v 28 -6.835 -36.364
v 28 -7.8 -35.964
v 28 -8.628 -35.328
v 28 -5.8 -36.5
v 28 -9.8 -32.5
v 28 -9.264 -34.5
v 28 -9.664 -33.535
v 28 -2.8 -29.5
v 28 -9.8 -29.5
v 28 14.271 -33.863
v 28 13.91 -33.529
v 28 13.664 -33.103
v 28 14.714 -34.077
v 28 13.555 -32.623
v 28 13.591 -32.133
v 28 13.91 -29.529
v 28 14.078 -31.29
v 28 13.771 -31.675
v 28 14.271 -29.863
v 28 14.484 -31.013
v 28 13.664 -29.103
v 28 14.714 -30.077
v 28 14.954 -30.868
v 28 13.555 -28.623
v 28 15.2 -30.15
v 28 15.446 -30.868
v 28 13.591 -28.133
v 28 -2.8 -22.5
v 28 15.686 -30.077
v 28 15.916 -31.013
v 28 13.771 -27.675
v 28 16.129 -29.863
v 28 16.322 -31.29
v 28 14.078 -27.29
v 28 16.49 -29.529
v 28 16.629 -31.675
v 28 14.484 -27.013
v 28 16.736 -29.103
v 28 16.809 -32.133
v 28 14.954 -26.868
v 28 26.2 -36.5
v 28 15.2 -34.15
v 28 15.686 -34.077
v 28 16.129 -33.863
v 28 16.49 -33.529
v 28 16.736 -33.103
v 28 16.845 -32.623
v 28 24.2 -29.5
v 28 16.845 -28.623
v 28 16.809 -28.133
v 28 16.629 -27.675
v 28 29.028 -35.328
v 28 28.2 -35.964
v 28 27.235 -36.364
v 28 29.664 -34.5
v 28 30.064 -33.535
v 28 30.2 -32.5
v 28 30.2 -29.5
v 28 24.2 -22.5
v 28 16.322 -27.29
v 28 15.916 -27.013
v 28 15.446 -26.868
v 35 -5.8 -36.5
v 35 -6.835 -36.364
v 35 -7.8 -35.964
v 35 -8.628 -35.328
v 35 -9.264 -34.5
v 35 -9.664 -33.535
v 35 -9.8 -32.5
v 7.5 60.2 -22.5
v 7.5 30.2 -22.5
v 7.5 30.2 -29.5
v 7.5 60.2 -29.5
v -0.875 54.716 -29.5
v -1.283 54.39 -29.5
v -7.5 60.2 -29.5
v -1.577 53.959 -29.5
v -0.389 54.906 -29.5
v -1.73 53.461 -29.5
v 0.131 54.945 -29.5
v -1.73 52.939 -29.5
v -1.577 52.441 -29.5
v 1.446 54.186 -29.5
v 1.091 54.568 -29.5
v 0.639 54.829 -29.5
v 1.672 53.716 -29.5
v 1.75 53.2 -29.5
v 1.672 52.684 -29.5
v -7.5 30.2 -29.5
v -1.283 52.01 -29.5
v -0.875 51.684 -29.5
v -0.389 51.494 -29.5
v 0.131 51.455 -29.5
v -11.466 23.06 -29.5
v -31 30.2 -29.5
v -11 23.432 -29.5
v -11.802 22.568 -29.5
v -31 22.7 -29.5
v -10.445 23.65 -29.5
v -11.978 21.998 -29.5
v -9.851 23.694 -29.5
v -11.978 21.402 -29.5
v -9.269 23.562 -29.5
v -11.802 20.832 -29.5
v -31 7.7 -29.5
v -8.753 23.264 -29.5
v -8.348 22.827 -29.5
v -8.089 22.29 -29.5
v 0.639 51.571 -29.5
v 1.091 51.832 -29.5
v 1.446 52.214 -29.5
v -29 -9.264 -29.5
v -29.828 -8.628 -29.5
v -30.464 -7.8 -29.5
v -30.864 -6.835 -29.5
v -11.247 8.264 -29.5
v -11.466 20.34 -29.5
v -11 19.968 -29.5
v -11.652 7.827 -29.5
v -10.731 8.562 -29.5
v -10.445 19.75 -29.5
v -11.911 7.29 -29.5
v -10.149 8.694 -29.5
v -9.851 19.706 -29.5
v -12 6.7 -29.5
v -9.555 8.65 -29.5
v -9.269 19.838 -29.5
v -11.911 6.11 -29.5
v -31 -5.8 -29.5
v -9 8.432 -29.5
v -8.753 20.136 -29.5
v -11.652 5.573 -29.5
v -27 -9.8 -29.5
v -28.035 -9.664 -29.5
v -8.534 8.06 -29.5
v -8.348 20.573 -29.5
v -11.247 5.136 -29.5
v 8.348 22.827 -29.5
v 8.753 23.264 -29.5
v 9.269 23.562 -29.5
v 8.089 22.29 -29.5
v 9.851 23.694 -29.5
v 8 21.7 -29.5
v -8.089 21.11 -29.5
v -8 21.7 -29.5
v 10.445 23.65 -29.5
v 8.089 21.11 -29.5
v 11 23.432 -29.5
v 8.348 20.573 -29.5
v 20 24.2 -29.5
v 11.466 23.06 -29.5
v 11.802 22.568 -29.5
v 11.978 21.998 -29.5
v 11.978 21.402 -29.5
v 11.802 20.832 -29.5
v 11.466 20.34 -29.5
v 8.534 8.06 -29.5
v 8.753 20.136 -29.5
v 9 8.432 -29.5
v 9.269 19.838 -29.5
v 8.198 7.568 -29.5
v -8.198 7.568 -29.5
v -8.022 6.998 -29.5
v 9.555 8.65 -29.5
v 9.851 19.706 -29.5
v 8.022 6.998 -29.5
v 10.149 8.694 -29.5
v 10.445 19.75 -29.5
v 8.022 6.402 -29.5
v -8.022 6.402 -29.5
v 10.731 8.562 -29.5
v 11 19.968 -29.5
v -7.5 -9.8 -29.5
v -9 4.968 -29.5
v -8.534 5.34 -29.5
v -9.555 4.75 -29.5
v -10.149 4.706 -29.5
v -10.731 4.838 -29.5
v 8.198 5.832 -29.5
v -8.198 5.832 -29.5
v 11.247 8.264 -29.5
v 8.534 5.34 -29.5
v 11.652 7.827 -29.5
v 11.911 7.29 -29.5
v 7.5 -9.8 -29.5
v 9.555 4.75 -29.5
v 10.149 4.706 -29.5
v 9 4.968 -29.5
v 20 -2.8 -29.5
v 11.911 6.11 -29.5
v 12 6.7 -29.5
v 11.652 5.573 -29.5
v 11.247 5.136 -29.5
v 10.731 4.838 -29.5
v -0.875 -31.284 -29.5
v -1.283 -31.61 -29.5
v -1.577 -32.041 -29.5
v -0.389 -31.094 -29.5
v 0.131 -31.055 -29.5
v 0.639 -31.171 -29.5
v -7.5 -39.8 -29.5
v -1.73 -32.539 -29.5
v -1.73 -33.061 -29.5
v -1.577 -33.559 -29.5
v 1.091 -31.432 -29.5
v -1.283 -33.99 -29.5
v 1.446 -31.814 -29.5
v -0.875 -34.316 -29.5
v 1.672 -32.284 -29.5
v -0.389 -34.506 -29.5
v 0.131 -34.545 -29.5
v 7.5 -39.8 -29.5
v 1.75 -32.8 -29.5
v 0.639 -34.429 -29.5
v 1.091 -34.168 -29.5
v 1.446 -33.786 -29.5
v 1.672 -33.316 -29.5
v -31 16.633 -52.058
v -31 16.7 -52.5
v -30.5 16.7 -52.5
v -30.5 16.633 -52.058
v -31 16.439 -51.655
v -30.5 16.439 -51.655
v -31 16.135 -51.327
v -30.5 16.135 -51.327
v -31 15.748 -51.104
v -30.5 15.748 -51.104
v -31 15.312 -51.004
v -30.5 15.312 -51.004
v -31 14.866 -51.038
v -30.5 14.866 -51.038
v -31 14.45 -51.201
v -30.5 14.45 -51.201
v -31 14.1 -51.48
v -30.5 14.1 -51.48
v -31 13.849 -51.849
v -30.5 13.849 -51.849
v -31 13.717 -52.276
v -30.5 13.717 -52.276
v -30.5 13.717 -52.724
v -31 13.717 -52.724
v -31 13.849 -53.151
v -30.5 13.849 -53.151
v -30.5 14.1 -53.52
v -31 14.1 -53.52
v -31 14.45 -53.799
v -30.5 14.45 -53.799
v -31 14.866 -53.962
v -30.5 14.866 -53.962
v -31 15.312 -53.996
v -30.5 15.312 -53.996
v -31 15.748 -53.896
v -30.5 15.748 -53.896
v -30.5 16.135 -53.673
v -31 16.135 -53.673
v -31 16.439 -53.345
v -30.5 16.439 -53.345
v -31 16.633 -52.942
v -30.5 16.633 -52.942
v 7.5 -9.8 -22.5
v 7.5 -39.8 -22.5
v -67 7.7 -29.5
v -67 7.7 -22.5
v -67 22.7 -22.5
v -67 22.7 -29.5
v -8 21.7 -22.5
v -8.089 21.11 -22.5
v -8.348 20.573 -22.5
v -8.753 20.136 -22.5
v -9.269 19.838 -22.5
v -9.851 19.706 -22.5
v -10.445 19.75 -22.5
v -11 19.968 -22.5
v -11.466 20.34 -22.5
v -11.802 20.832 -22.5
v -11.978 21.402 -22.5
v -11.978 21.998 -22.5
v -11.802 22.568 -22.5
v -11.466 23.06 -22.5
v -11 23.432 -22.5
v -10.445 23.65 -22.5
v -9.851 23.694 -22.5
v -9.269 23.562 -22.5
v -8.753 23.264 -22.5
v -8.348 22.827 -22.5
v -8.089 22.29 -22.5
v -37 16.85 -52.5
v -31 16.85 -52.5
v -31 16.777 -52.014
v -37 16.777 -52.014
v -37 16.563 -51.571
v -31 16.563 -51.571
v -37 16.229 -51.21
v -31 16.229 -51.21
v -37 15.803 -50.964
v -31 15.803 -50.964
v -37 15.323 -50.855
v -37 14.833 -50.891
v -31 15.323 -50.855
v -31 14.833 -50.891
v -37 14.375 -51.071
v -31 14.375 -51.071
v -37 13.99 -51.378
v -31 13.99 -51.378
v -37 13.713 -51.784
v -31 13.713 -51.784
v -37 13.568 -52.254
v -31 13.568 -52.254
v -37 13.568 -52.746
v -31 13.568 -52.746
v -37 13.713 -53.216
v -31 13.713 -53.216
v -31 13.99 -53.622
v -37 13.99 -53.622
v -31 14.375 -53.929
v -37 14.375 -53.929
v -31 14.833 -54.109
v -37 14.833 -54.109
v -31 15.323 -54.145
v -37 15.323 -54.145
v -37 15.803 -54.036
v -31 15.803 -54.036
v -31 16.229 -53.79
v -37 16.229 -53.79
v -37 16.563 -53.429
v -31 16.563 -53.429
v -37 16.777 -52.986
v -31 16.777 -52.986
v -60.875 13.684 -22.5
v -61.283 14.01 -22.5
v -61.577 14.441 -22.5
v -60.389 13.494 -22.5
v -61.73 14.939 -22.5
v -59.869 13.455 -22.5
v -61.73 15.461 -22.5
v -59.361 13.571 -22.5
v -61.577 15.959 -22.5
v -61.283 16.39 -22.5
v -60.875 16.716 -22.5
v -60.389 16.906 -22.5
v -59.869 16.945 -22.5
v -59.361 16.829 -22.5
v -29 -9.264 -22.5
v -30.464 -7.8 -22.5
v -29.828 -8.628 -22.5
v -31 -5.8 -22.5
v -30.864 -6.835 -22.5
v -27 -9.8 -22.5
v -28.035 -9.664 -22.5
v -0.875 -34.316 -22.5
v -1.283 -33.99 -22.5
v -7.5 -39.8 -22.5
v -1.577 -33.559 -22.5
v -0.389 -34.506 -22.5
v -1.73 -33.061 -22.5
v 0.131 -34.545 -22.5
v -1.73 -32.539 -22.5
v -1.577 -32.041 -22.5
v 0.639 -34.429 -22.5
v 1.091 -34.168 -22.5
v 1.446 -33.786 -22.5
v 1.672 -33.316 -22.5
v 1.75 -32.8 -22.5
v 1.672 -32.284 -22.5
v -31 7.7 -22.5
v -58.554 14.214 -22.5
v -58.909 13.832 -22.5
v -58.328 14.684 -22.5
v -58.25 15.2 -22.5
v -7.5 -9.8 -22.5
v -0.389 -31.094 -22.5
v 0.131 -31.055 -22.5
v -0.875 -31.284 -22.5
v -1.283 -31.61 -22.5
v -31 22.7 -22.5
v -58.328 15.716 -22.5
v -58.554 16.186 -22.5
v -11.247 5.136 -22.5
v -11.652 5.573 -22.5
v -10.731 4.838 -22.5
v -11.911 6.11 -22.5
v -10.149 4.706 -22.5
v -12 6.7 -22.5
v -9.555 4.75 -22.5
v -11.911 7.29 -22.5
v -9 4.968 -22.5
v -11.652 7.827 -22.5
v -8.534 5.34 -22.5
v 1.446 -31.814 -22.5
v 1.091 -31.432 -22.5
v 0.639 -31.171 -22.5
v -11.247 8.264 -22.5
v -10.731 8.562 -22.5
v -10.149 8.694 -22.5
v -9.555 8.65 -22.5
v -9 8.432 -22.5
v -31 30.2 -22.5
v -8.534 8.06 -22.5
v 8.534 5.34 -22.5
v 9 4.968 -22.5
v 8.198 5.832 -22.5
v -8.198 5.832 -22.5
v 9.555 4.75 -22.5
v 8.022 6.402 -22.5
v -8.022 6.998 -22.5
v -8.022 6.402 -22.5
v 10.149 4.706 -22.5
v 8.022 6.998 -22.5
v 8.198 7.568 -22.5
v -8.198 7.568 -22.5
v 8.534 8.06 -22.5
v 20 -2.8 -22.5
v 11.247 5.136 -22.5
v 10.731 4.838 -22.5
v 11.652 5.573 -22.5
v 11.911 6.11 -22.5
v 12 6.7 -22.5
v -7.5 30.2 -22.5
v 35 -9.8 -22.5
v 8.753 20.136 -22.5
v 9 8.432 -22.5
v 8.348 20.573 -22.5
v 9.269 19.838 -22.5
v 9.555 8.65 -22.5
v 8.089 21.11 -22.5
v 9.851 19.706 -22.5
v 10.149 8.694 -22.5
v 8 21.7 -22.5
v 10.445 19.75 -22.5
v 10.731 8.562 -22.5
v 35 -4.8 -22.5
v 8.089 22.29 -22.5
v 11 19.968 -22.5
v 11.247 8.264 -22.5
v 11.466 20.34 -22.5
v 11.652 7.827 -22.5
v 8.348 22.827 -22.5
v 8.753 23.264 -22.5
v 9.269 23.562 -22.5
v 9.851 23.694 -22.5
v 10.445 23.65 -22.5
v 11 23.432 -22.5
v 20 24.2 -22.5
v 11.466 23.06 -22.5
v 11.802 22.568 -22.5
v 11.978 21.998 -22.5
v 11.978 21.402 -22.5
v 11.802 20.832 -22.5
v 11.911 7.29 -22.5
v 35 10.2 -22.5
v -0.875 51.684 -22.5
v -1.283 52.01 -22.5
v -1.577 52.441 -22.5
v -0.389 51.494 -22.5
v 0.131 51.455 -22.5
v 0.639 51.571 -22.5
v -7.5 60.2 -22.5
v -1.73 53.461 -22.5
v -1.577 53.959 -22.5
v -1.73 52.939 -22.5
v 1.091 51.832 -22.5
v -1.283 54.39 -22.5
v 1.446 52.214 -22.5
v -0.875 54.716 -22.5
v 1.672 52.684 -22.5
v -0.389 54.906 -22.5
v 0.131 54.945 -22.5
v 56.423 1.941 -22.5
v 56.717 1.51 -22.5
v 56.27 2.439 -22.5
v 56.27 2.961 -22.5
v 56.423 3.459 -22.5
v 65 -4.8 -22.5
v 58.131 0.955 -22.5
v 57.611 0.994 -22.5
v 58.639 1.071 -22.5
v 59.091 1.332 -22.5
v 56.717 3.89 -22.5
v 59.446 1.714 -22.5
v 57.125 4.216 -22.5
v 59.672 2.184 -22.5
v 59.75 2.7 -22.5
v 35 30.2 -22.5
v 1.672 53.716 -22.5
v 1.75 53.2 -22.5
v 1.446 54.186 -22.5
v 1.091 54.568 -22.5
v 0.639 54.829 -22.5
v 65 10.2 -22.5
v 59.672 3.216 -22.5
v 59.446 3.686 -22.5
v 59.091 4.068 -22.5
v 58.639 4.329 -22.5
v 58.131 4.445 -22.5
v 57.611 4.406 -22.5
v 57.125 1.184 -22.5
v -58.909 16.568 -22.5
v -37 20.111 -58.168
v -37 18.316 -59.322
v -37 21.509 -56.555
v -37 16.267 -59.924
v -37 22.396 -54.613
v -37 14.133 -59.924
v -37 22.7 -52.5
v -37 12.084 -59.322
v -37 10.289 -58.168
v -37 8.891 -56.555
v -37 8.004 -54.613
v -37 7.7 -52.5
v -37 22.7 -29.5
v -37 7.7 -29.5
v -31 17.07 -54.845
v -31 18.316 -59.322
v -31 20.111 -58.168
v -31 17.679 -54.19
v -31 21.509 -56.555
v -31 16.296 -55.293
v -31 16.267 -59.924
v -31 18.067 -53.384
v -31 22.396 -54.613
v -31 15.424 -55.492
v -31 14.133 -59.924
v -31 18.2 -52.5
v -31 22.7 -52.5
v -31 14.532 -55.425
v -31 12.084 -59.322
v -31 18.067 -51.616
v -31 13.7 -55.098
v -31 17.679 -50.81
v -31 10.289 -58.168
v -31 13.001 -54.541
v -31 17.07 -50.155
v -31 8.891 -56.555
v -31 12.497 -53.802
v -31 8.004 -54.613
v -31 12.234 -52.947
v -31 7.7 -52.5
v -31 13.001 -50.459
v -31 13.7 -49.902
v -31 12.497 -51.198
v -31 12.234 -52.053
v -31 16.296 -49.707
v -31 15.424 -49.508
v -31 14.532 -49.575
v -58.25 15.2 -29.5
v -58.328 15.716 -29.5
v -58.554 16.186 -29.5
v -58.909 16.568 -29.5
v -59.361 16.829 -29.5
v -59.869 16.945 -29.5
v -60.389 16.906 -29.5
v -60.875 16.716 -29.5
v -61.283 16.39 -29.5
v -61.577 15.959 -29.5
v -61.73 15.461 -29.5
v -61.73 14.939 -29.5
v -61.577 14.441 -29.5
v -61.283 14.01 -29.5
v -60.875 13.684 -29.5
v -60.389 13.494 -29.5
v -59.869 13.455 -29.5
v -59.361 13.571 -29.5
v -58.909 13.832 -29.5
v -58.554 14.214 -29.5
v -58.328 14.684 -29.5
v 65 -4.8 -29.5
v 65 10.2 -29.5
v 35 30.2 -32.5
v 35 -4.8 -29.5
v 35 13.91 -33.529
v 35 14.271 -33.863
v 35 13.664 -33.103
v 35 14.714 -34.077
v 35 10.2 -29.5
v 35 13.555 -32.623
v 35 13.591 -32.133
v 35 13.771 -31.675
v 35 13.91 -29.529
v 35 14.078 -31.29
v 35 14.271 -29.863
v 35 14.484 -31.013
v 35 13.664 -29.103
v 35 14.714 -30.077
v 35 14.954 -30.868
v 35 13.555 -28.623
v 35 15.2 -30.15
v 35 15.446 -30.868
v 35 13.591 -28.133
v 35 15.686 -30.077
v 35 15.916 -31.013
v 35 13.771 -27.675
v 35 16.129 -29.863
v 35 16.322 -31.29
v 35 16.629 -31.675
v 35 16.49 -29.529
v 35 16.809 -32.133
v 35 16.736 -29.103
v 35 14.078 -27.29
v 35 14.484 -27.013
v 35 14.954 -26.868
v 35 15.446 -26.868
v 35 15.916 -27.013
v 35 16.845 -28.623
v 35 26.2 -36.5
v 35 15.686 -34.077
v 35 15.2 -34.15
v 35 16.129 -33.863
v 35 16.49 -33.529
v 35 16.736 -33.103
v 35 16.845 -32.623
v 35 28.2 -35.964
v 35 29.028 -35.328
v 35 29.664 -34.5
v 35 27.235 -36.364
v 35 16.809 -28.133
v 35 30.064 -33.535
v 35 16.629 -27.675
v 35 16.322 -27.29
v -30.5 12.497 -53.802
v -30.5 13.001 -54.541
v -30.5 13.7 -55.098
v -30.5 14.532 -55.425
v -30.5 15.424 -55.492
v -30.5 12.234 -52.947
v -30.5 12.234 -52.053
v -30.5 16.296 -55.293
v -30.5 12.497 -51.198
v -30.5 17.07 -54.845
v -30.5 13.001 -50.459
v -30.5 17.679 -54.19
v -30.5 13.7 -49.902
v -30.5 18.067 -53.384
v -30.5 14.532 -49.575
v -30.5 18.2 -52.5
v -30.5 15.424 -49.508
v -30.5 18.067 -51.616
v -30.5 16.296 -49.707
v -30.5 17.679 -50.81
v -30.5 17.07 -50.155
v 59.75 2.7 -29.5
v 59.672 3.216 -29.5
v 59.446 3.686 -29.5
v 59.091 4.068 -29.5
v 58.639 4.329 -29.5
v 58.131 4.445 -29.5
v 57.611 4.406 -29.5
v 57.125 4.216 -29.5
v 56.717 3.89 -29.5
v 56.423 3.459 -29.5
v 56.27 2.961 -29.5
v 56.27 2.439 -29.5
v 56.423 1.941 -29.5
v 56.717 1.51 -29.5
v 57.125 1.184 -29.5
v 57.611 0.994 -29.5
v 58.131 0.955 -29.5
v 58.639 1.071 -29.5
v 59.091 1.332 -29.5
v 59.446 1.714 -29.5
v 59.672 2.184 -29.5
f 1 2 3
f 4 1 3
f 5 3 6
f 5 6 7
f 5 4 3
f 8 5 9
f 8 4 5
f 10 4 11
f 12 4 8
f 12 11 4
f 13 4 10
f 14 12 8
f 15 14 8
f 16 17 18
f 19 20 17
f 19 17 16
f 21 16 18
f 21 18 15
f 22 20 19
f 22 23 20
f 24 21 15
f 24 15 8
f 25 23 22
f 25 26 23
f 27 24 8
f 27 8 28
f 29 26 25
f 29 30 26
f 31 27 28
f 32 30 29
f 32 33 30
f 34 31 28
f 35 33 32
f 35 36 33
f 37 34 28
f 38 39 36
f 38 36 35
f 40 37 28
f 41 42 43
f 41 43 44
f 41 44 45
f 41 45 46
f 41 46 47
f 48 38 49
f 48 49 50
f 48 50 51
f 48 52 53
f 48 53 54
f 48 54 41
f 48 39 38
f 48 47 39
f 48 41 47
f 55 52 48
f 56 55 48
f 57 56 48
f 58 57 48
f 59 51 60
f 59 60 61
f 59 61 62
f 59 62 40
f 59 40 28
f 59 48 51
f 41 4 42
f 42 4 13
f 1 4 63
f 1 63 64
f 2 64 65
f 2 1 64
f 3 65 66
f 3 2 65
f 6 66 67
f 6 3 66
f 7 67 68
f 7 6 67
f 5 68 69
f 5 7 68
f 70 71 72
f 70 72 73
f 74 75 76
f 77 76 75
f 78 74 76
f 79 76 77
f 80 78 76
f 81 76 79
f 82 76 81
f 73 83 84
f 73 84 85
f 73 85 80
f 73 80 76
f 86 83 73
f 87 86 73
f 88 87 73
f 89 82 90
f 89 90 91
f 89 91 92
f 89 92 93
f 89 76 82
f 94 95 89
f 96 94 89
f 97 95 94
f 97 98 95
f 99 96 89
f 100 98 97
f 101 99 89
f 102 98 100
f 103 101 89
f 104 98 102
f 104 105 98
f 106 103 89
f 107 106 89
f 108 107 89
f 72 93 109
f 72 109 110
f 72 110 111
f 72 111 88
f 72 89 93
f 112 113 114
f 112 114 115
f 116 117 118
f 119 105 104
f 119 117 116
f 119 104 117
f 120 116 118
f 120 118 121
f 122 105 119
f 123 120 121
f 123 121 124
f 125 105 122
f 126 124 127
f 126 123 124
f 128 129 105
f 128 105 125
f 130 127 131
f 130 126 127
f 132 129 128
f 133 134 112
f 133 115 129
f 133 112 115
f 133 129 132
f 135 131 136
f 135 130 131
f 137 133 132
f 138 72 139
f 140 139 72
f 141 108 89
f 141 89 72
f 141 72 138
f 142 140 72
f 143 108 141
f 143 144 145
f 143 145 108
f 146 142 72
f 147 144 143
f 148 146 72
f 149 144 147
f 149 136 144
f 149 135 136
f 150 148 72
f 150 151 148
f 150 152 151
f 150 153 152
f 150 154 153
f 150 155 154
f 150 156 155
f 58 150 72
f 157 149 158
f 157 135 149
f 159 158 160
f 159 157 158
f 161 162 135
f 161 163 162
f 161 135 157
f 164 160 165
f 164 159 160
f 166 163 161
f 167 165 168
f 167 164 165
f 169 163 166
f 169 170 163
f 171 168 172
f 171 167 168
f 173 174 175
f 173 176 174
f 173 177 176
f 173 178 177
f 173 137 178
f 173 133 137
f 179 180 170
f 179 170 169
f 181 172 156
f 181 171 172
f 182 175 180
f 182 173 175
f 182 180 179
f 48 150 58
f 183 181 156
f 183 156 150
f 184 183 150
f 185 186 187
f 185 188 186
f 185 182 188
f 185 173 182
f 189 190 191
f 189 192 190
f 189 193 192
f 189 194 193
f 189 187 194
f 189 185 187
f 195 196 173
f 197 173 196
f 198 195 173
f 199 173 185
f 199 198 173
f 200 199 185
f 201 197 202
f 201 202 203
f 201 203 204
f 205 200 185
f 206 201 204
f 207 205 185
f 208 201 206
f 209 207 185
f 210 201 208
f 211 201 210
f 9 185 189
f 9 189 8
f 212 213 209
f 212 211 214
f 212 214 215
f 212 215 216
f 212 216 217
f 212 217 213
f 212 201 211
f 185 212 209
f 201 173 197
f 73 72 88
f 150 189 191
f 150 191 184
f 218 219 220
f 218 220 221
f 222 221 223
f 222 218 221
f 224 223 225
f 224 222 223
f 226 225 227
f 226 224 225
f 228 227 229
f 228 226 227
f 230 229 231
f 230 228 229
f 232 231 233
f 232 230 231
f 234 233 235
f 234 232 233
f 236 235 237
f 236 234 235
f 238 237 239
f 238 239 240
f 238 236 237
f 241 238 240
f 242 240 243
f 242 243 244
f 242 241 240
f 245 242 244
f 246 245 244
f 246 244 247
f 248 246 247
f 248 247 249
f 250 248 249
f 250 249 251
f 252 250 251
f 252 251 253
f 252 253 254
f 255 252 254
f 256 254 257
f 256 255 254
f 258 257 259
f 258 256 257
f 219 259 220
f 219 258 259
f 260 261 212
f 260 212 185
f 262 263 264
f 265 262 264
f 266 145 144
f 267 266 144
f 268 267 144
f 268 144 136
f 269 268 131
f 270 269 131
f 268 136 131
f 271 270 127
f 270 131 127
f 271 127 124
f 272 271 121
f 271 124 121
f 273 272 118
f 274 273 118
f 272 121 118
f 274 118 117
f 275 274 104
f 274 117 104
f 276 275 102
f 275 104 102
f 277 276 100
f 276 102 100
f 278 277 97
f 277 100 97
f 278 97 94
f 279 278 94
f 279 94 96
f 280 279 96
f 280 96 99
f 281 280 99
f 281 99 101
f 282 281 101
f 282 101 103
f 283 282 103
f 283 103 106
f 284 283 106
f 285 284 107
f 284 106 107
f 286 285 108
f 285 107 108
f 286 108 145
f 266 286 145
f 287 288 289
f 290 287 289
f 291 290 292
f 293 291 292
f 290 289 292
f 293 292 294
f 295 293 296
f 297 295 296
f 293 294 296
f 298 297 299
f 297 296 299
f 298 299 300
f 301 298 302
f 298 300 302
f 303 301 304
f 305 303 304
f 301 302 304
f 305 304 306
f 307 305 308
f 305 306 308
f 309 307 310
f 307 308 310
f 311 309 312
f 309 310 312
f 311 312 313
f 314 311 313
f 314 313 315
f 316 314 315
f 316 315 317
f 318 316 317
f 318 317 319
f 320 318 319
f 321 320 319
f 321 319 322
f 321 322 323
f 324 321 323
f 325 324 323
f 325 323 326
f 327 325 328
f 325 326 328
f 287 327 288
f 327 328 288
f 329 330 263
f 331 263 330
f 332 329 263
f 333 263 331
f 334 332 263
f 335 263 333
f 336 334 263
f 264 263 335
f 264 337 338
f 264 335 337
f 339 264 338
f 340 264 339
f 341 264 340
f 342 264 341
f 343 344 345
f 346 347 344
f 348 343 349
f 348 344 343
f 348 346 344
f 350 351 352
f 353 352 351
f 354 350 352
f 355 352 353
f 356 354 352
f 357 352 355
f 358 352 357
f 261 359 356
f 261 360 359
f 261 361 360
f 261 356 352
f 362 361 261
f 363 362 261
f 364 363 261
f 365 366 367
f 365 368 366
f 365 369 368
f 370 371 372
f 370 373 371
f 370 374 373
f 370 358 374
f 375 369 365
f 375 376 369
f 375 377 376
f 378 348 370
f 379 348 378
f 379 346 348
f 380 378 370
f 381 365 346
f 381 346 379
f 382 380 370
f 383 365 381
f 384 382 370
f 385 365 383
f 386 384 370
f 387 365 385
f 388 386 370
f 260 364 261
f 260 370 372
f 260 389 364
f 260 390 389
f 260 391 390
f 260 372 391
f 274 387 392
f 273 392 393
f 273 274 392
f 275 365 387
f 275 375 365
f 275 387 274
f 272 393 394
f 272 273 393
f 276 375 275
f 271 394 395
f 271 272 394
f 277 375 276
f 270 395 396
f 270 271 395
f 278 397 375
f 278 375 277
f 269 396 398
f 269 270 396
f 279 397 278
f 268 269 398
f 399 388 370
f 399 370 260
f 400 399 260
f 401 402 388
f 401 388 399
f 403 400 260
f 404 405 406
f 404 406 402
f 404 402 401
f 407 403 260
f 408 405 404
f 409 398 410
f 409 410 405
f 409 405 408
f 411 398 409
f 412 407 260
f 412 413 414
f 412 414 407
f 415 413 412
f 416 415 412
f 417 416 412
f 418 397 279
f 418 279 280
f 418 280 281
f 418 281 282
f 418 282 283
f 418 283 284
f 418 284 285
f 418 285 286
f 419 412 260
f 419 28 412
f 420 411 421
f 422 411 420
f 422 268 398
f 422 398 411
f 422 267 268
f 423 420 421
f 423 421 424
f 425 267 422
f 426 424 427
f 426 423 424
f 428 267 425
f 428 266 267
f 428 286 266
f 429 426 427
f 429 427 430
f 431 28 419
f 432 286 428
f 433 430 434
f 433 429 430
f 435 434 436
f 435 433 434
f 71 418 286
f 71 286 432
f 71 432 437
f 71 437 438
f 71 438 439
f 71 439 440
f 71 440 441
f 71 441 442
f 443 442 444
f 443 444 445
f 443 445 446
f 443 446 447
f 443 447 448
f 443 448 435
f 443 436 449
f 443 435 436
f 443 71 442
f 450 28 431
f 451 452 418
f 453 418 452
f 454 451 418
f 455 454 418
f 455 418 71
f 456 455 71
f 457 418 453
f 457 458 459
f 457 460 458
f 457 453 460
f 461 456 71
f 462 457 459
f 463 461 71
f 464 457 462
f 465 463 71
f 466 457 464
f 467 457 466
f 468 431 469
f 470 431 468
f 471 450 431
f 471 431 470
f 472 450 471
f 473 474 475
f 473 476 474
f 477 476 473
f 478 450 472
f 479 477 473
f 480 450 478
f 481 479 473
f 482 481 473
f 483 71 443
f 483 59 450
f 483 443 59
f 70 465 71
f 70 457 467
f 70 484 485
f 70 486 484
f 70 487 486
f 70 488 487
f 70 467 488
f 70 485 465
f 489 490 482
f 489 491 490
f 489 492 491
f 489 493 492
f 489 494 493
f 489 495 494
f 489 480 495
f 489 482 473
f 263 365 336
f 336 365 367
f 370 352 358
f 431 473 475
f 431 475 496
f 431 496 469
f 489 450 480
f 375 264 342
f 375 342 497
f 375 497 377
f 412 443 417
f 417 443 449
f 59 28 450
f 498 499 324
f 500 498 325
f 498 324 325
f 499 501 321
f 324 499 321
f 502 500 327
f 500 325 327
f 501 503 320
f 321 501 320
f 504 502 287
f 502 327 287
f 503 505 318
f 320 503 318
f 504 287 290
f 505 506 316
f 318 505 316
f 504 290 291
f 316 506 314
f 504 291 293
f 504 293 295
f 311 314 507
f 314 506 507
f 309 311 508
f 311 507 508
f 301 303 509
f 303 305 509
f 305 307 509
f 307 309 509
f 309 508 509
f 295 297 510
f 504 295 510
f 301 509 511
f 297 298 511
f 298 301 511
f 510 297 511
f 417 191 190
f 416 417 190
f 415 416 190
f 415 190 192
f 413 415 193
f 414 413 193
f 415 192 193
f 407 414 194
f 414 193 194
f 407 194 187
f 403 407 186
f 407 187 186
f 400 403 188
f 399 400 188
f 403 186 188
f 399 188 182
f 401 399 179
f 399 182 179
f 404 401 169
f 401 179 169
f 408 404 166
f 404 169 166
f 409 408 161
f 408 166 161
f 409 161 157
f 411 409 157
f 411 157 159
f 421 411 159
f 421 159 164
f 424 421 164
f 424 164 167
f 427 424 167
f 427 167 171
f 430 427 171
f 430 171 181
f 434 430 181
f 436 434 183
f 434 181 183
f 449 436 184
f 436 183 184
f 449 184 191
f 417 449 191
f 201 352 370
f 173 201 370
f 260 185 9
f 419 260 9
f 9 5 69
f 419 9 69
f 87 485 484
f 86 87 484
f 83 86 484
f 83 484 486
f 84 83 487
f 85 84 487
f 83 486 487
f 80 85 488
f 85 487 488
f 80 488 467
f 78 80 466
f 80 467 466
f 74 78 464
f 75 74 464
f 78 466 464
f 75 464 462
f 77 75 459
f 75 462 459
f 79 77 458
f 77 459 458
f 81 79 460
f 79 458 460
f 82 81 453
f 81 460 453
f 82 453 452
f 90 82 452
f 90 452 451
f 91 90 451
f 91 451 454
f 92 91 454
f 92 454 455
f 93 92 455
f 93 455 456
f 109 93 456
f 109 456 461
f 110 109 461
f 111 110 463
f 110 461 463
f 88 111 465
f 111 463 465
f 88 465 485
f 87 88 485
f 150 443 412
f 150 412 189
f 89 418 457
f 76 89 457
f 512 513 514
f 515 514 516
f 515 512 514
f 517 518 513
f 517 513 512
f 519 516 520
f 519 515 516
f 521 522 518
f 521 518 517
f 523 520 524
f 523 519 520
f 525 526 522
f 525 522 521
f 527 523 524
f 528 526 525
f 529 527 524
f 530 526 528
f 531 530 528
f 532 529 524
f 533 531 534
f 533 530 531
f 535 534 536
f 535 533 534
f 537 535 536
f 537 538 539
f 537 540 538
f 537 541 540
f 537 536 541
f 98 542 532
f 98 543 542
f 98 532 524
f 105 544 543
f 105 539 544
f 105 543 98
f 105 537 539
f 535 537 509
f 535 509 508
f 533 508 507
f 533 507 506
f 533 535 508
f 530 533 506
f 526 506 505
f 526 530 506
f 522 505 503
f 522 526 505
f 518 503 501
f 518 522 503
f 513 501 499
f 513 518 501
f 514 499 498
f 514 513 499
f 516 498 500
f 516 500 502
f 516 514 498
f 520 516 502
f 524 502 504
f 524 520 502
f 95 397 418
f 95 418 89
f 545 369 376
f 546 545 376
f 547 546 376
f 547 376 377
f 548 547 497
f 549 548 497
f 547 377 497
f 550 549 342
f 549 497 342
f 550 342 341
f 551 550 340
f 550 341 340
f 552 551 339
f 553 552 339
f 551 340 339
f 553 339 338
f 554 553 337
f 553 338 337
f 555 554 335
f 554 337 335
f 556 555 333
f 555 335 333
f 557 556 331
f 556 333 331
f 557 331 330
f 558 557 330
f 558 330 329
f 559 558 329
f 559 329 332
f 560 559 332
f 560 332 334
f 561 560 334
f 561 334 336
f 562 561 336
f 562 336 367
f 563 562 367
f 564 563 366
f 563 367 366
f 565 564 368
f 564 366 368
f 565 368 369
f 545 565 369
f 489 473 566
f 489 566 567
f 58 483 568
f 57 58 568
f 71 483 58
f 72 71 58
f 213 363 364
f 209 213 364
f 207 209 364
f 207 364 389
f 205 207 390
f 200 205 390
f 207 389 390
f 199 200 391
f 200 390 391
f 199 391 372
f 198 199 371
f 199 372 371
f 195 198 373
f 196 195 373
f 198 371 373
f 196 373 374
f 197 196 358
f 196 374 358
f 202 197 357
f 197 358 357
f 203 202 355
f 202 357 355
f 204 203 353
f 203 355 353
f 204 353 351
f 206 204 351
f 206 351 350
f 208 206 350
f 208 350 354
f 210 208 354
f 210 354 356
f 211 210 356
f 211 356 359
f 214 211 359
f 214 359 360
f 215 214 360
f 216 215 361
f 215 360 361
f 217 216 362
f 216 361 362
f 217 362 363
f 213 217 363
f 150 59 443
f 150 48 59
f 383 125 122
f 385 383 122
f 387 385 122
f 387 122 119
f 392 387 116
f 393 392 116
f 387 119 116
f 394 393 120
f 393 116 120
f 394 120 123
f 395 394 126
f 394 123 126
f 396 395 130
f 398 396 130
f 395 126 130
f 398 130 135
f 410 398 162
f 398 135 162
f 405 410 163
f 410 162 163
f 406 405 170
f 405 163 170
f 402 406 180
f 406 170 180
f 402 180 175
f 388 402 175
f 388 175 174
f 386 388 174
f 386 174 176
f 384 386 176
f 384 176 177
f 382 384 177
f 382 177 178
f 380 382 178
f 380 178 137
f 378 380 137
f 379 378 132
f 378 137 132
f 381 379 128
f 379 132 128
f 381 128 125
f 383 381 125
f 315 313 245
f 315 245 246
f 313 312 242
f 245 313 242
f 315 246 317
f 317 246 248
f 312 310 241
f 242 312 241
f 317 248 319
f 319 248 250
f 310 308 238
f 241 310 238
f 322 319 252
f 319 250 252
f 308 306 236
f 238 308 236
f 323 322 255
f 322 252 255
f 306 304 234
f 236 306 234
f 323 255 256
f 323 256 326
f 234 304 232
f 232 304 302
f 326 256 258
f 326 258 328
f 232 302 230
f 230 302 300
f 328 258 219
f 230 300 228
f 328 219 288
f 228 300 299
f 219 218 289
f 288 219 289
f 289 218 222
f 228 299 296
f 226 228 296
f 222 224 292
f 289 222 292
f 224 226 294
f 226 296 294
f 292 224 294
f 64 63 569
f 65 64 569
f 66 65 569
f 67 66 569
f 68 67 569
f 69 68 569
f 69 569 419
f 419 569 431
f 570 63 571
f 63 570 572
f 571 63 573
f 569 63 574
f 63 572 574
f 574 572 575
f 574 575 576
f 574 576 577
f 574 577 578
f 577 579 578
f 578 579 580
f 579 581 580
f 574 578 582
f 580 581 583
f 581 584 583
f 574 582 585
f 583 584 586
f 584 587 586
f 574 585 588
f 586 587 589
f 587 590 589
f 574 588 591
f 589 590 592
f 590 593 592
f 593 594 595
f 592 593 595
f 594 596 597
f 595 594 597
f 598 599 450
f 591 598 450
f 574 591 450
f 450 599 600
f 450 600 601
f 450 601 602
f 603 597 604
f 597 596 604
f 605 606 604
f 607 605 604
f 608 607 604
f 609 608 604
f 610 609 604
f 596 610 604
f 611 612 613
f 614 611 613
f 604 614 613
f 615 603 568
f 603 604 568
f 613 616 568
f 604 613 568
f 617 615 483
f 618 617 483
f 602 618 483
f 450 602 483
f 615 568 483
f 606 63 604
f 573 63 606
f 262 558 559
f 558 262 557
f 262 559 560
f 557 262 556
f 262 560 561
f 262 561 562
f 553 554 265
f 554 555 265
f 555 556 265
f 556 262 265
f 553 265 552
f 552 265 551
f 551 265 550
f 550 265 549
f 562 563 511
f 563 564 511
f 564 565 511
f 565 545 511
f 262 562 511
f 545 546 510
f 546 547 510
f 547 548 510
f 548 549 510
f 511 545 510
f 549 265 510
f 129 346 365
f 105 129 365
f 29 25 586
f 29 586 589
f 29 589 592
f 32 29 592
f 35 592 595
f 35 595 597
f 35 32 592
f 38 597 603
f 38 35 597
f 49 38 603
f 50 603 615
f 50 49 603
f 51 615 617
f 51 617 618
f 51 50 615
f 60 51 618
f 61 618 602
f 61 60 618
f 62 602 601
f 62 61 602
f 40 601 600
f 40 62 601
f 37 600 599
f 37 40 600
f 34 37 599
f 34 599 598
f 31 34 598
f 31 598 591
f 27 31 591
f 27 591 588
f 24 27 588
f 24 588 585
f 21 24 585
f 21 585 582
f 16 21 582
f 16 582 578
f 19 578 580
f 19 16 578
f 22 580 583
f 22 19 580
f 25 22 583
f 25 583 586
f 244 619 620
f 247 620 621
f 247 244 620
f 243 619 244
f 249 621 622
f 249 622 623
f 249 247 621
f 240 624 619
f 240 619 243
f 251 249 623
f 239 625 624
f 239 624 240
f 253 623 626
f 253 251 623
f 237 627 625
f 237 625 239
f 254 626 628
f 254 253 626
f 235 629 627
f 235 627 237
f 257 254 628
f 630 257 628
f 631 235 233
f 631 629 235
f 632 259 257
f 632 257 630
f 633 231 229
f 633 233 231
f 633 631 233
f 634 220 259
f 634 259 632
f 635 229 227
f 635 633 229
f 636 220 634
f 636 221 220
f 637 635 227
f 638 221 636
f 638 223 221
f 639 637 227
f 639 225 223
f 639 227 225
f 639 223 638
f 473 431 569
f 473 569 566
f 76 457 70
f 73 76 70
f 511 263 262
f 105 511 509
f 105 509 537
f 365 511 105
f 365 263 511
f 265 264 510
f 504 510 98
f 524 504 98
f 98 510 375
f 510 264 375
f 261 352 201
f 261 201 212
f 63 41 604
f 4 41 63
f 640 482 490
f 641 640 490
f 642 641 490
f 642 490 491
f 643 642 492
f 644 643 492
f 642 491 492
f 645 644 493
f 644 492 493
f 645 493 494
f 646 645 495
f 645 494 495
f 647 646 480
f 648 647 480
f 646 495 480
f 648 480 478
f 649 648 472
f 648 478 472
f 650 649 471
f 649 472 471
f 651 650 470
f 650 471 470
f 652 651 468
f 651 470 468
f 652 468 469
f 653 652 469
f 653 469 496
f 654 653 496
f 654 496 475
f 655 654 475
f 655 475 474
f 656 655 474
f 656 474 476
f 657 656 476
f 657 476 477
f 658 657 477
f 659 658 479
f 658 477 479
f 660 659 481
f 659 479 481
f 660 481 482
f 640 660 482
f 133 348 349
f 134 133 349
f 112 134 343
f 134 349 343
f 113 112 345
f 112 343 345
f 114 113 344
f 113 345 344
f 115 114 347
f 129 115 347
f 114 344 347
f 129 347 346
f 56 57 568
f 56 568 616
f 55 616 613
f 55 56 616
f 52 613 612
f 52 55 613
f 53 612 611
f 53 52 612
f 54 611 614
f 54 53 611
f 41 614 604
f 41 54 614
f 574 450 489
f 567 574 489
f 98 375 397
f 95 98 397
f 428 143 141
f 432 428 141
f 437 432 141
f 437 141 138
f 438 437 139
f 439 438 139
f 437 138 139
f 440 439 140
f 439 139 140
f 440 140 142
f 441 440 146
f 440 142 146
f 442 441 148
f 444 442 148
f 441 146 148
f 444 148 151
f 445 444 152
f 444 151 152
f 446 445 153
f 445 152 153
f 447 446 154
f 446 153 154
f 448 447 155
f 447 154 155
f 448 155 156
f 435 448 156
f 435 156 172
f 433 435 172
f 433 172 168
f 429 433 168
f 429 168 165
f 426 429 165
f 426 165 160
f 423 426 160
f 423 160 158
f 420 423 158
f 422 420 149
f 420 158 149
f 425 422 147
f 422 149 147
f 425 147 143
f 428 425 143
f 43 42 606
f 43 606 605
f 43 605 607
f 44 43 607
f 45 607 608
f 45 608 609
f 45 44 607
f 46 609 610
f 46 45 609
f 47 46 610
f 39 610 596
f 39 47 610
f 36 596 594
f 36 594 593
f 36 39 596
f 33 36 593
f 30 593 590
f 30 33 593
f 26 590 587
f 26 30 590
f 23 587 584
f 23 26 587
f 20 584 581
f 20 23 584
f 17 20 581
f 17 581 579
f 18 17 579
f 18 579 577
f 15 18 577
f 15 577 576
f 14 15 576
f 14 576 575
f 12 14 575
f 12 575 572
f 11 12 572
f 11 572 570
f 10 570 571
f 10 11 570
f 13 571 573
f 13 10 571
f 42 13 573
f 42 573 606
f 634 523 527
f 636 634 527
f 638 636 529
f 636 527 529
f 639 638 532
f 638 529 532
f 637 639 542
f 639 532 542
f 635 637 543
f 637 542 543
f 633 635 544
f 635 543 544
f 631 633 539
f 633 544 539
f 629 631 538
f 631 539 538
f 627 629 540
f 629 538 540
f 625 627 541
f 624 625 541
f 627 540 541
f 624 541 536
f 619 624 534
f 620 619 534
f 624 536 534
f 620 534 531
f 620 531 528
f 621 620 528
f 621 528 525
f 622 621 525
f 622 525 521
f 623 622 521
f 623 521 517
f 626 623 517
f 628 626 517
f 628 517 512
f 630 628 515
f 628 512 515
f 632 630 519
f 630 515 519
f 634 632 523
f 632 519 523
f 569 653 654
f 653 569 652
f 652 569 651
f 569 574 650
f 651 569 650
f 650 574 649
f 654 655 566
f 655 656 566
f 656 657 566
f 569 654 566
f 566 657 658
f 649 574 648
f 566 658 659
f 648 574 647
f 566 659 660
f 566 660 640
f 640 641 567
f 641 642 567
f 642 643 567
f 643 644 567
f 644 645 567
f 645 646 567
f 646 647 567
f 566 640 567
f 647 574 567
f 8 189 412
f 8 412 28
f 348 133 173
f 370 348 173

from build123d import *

# Parameters (mm, degrees)
EXTRUDE_START       = 24.2
EXTRUDE_1_DEPTH     = 6
SKETCH_5_W          = 40
SKETCH_5_H          = 34
SKETCH_5_R          = 2
EXTRUDE_2_DEPTH     = 7
EXTRUDE_START_2     = -9.8
SKETCH_7_R          = 4.1
EXTRUDE_3_DEPTH     = 7
EXTRUDE_START_3     = -53
SKETCH_9_R          = 1.65
EXTRUDE_4_DEPTH     = 6
EXTRUDE_START_4     = -22.5
EXTRUDE_5_DEPTH     = 7
EXTRUDE_START_5     = 28
SKETCH_14_R         = 1.65
EXTRUDE_8_DEPTH     = 7
SKETCH_15_W         = 8
SKETCH_15_H         = 7
EXTRUDE_9_DEPTH     = 7
SKETCH_17_R         = 3
SKETCH_17_R_2       = 1.5
EXTRUDE_11_DEPTH    = 0.5
SKETCH_18_W         = 50.26694464
SKETCH_18_H         = 22.871129036
CUT_EXTRUDE_1_DEPTH = 50
SKETCH_19_W         = 15
SKETCH_19_H         = 30
SKETCH_19_R         = 1.75
SKETCH_19_W_2       = 30
SKETCH_19_H_2       = 15
EXTRUDE_12_DEPTH    = 7


with BuildPart() as part:
    # 草图4 → 凸台-拉伸1 (new body)
    with BuildSketch(Plane(origin=(0, 0, 0), x_dir=(1, 0, 0), z_dir=(0, 1, 0)).offset(EXTRUDE_START)):
        Polygon((-21, 22.5), (-28, 22.5), (-28, 29.5), (28, 29.5), (28, 22.5), (21, 22.5), align=None)
    extrude(amount=EXTRUDE_1_DEPTH)

    # 草图5 → 凸台-拉伸2 (add)
    with BuildSketch(Plane(origin=(0, 0, -29.5), x_dir=(-1, 0, 0), z_dir=(0, 0, -1))):
        with Locations((0, 7.2)):
            Rectangle(SKETCH_5_W, SKETCH_5_H)
        with Locations((-10, 21.7)):
            Circle(SKETCH_5_R, mode=Mode.SUBTRACT)
        with Locations(Location((10, 21.7, 0), (0, 0, 180))):
            Circle(SKETCH_5_R, mode=Mode.SUBTRACT)
        with Locations((10, 6.7)):
            Circle(SKETCH_5_R, mode=Mode.SUBTRACT)
        with Locations(Location((-10, 6.7, 0), (0, 0, 180))):
            Circle(SKETCH_5_R, mode=Mode.SUBTRACT)
    extrude(amount=-EXTRUDE_2_DEPTH)

    # 草图7 → 凸台-拉伸3 (add)
    with BuildSketch(Plane(origin=(0, 0, 0), x_dir=(1, 0, 0), z_dir=(0, 1, 0)).offset(EXTRUDE_START_2)):
        with BuildLine():
            Line((20, 22.5), (-20, 22.5))
            Line((-20, 22.5), (-20, 2.5))
            ThreePointArc((-20, 2.5), (-19.121320344, 0.378679656), (-17, -0.5))
            Line((-17, -0.5), (17, -0.5))
            ThreePointArc((17, -0.5), (19.121320344, 0.378679656), (20, 2.5))
            Line((20, 2.5), (20, 22.5))
        make_face()
        with Locations(Location((10, 10, 0), (0, 0, 90))):
            Circle(SKETCH_7_R, mode=Mode.SUBTRACT)
    extrude(amount=EXTRUDE_3_DEPTH)



with BuildPart() as body_2:
    # 草图9 → 凸台-拉伸4 (new body)
    with BuildSketch(Plane(origin=(22, 25.2, -43.868265324), x_dir=(0, 0, 1), z_dir=(1, 0, 0)).offset(EXTRUDE_START_3)):
        with BuildLine():
            Line((-8.631734676, 2.5), (21.368265324, 2.5))
            Line((21.368265324, 2.5), (21.368265324, 17.5))
            Line((21.368265324, 17.5), (-8.631734676, 17.5))
            ThreePointArc((-8.631734676, 17.5), (-16.131734676, 10), (-8.631734676, 2.5))
        make_face()
        with Locations(Location((-8.631734676, 10, 0), (0, 0, 270))):
            Circle(SKETCH_9_R, mode=Mode.SUBTRACT)
    extrude(amount=-EXTRUDE_4_DEPTH)


with BuildPart() as part_1:
    add(part.part)

    add(body_2.part)  # 凸台-拉伸5 merges body 2
    # 草图10 → 凸台-拉伸5 (add)
    with BuildSketch(Plane.XY.offset(EXTRUDE_START_4)):
        with BuildLine():
            Line((-31, 30.2), (-20, 30.2))
            Line((-20, 30.2), (-20, -9.8))
            Line((-20, -9.8), (-27, -9.8))
            ThreePointArc((-27, -9.8), (-29.828427125, -8.628427125), (-31, -5.8))
            Line((-31, -5.8), (-31, 30.2))
        make_face()
    extrude(amount=-EXTRUDE_5_DEPTH)

    # 草图14 → 凸台-拉伸8 (add)
    with BuildSketch(Plane(origin=(0, 0, 0), x_dir=(0, 0, -1), z_dir=(1, 0, 0)).offset(EXTRUDE_START_5)):
        with BuildLine():
            Line((22.5, 30.2), (32.5, 30.2))
            ThreePointArc((32.5, 30.2), (35.328427125, 29.028427125), (36.5, 26.2))
            Line((36.5, 26.2), (36.5, -5.8))
            ThreePointArc((36.5, -5.8), (35.328427125, -8.628427125), (32.5, -9.8))
            Line((32.5, -9.8), (22.5, -9.8))
            Line((22.5, -9.8), (22.5, 30.2))
        make_face()
        with Locations((28.5, 15.2)):
            Circle(SKETCH_14_R, mode=Mode.SUBTRACT)
        with Locations((32.5, 15.2)):
            Circle(SKETCH_14_R, mode=Mode.SUBTRACT)
    extrude(amount=EXTRUDE_8_DEPTH)

    # 草图15 → 凸台-拉伸9 (add)
    with BuildSketch(Plane(origin=(0, 0, 0), x_dir=(1, 0, 0), z_dir=(0, 1, 0)).offset(EXTRUDE_START_2)):
        with Locations((24, 26)):
            Rectangle(SKETCH_15_W, SKETCH_15_H)
    extrude(amount=EXTRUDE_9_DEPTH)

    # 草图17 → 凸台-拉伸11 (add)
    with BuildSketch(Plane(origin=(-31, 0, 0), x_dir=(0, 0, -1), z_dir=(1, 0, 0))):
        with Locations(Location((52.5, 15.2, 0), (0, 0, 90))):
            Circle(SKETCH_17_R)
        with Locations(Location((52.5, 15.2, 0), (0, 0, 90))):
            Circle(SKETCH_17_R_2, mode=Mode.SUBTRACT)
    extrude(amount=EXTRUDE_11_DEPTH)

    # 草图18 → 切除-拉伸1 (cut)
    with BuildSketch(Plane.XY.offset(-22.5)):
        Rectangle(SKETCH_18_W, SKETCH_18_H)
    extrude(amount=CUT_EXTRUDE_1_DEPTH, mode=Mode.SUBTRACT)

    # 草图19 → 凸台-拉伸12 (add)
    # profile 1 of 4: a face of its own
    with BuildSketch(Plane.XY.offset(EXTRUDE_START_4)):
        with Locations((0, 45.2)):
            Rectangle(SKETCH_19_W, SKETCH_19_H)
        with Locations((0, 53.2)):
            Circle(SKETCH_19_R, mode=Mode.SUBTRACT)
    # profile 2 of 4: a face of its own
    with BuildSketch(Plane.XY.offset(EXTRUDE_START_4)):
        with Locations((-52, 15.2)):
            Rectangle(SKETCH_19_W_2, SKETCH_19_H_2)
        with Locations((-60, 15.2)):
            Circle(SKETCH_19_R, mode=Mode.SUBTRACT)
    # profile 3 of 4: a face of its own
    with BuildSketch(Plane.XY.offset(EXTRUDE_START_4)):
        with Locations((50, 2.7)):
            Rectangle(SKETCH_19_W_2, SKETCH_19_H_2)
        with Locations((58, 2.7)):
            Circle(SKETCH_19_R, mode=Mode.SUBTRACT)
    # profile 4 of 4: a face of its own
    with BuildSketch(Plane.XY.offset(EXTRUDE_START_4)):
        with Locations((0, -24.8)):
            Rectangle(SKETCH_19_W, SKETCH_19_H)
        with Locations((0, -32.8)):
            Circle(SKETCH_19_R, mode=Mode.SUBTRACT)
    extrude(amount=-EXTRUDE_12_DEPTH)


solid = part_1.part
